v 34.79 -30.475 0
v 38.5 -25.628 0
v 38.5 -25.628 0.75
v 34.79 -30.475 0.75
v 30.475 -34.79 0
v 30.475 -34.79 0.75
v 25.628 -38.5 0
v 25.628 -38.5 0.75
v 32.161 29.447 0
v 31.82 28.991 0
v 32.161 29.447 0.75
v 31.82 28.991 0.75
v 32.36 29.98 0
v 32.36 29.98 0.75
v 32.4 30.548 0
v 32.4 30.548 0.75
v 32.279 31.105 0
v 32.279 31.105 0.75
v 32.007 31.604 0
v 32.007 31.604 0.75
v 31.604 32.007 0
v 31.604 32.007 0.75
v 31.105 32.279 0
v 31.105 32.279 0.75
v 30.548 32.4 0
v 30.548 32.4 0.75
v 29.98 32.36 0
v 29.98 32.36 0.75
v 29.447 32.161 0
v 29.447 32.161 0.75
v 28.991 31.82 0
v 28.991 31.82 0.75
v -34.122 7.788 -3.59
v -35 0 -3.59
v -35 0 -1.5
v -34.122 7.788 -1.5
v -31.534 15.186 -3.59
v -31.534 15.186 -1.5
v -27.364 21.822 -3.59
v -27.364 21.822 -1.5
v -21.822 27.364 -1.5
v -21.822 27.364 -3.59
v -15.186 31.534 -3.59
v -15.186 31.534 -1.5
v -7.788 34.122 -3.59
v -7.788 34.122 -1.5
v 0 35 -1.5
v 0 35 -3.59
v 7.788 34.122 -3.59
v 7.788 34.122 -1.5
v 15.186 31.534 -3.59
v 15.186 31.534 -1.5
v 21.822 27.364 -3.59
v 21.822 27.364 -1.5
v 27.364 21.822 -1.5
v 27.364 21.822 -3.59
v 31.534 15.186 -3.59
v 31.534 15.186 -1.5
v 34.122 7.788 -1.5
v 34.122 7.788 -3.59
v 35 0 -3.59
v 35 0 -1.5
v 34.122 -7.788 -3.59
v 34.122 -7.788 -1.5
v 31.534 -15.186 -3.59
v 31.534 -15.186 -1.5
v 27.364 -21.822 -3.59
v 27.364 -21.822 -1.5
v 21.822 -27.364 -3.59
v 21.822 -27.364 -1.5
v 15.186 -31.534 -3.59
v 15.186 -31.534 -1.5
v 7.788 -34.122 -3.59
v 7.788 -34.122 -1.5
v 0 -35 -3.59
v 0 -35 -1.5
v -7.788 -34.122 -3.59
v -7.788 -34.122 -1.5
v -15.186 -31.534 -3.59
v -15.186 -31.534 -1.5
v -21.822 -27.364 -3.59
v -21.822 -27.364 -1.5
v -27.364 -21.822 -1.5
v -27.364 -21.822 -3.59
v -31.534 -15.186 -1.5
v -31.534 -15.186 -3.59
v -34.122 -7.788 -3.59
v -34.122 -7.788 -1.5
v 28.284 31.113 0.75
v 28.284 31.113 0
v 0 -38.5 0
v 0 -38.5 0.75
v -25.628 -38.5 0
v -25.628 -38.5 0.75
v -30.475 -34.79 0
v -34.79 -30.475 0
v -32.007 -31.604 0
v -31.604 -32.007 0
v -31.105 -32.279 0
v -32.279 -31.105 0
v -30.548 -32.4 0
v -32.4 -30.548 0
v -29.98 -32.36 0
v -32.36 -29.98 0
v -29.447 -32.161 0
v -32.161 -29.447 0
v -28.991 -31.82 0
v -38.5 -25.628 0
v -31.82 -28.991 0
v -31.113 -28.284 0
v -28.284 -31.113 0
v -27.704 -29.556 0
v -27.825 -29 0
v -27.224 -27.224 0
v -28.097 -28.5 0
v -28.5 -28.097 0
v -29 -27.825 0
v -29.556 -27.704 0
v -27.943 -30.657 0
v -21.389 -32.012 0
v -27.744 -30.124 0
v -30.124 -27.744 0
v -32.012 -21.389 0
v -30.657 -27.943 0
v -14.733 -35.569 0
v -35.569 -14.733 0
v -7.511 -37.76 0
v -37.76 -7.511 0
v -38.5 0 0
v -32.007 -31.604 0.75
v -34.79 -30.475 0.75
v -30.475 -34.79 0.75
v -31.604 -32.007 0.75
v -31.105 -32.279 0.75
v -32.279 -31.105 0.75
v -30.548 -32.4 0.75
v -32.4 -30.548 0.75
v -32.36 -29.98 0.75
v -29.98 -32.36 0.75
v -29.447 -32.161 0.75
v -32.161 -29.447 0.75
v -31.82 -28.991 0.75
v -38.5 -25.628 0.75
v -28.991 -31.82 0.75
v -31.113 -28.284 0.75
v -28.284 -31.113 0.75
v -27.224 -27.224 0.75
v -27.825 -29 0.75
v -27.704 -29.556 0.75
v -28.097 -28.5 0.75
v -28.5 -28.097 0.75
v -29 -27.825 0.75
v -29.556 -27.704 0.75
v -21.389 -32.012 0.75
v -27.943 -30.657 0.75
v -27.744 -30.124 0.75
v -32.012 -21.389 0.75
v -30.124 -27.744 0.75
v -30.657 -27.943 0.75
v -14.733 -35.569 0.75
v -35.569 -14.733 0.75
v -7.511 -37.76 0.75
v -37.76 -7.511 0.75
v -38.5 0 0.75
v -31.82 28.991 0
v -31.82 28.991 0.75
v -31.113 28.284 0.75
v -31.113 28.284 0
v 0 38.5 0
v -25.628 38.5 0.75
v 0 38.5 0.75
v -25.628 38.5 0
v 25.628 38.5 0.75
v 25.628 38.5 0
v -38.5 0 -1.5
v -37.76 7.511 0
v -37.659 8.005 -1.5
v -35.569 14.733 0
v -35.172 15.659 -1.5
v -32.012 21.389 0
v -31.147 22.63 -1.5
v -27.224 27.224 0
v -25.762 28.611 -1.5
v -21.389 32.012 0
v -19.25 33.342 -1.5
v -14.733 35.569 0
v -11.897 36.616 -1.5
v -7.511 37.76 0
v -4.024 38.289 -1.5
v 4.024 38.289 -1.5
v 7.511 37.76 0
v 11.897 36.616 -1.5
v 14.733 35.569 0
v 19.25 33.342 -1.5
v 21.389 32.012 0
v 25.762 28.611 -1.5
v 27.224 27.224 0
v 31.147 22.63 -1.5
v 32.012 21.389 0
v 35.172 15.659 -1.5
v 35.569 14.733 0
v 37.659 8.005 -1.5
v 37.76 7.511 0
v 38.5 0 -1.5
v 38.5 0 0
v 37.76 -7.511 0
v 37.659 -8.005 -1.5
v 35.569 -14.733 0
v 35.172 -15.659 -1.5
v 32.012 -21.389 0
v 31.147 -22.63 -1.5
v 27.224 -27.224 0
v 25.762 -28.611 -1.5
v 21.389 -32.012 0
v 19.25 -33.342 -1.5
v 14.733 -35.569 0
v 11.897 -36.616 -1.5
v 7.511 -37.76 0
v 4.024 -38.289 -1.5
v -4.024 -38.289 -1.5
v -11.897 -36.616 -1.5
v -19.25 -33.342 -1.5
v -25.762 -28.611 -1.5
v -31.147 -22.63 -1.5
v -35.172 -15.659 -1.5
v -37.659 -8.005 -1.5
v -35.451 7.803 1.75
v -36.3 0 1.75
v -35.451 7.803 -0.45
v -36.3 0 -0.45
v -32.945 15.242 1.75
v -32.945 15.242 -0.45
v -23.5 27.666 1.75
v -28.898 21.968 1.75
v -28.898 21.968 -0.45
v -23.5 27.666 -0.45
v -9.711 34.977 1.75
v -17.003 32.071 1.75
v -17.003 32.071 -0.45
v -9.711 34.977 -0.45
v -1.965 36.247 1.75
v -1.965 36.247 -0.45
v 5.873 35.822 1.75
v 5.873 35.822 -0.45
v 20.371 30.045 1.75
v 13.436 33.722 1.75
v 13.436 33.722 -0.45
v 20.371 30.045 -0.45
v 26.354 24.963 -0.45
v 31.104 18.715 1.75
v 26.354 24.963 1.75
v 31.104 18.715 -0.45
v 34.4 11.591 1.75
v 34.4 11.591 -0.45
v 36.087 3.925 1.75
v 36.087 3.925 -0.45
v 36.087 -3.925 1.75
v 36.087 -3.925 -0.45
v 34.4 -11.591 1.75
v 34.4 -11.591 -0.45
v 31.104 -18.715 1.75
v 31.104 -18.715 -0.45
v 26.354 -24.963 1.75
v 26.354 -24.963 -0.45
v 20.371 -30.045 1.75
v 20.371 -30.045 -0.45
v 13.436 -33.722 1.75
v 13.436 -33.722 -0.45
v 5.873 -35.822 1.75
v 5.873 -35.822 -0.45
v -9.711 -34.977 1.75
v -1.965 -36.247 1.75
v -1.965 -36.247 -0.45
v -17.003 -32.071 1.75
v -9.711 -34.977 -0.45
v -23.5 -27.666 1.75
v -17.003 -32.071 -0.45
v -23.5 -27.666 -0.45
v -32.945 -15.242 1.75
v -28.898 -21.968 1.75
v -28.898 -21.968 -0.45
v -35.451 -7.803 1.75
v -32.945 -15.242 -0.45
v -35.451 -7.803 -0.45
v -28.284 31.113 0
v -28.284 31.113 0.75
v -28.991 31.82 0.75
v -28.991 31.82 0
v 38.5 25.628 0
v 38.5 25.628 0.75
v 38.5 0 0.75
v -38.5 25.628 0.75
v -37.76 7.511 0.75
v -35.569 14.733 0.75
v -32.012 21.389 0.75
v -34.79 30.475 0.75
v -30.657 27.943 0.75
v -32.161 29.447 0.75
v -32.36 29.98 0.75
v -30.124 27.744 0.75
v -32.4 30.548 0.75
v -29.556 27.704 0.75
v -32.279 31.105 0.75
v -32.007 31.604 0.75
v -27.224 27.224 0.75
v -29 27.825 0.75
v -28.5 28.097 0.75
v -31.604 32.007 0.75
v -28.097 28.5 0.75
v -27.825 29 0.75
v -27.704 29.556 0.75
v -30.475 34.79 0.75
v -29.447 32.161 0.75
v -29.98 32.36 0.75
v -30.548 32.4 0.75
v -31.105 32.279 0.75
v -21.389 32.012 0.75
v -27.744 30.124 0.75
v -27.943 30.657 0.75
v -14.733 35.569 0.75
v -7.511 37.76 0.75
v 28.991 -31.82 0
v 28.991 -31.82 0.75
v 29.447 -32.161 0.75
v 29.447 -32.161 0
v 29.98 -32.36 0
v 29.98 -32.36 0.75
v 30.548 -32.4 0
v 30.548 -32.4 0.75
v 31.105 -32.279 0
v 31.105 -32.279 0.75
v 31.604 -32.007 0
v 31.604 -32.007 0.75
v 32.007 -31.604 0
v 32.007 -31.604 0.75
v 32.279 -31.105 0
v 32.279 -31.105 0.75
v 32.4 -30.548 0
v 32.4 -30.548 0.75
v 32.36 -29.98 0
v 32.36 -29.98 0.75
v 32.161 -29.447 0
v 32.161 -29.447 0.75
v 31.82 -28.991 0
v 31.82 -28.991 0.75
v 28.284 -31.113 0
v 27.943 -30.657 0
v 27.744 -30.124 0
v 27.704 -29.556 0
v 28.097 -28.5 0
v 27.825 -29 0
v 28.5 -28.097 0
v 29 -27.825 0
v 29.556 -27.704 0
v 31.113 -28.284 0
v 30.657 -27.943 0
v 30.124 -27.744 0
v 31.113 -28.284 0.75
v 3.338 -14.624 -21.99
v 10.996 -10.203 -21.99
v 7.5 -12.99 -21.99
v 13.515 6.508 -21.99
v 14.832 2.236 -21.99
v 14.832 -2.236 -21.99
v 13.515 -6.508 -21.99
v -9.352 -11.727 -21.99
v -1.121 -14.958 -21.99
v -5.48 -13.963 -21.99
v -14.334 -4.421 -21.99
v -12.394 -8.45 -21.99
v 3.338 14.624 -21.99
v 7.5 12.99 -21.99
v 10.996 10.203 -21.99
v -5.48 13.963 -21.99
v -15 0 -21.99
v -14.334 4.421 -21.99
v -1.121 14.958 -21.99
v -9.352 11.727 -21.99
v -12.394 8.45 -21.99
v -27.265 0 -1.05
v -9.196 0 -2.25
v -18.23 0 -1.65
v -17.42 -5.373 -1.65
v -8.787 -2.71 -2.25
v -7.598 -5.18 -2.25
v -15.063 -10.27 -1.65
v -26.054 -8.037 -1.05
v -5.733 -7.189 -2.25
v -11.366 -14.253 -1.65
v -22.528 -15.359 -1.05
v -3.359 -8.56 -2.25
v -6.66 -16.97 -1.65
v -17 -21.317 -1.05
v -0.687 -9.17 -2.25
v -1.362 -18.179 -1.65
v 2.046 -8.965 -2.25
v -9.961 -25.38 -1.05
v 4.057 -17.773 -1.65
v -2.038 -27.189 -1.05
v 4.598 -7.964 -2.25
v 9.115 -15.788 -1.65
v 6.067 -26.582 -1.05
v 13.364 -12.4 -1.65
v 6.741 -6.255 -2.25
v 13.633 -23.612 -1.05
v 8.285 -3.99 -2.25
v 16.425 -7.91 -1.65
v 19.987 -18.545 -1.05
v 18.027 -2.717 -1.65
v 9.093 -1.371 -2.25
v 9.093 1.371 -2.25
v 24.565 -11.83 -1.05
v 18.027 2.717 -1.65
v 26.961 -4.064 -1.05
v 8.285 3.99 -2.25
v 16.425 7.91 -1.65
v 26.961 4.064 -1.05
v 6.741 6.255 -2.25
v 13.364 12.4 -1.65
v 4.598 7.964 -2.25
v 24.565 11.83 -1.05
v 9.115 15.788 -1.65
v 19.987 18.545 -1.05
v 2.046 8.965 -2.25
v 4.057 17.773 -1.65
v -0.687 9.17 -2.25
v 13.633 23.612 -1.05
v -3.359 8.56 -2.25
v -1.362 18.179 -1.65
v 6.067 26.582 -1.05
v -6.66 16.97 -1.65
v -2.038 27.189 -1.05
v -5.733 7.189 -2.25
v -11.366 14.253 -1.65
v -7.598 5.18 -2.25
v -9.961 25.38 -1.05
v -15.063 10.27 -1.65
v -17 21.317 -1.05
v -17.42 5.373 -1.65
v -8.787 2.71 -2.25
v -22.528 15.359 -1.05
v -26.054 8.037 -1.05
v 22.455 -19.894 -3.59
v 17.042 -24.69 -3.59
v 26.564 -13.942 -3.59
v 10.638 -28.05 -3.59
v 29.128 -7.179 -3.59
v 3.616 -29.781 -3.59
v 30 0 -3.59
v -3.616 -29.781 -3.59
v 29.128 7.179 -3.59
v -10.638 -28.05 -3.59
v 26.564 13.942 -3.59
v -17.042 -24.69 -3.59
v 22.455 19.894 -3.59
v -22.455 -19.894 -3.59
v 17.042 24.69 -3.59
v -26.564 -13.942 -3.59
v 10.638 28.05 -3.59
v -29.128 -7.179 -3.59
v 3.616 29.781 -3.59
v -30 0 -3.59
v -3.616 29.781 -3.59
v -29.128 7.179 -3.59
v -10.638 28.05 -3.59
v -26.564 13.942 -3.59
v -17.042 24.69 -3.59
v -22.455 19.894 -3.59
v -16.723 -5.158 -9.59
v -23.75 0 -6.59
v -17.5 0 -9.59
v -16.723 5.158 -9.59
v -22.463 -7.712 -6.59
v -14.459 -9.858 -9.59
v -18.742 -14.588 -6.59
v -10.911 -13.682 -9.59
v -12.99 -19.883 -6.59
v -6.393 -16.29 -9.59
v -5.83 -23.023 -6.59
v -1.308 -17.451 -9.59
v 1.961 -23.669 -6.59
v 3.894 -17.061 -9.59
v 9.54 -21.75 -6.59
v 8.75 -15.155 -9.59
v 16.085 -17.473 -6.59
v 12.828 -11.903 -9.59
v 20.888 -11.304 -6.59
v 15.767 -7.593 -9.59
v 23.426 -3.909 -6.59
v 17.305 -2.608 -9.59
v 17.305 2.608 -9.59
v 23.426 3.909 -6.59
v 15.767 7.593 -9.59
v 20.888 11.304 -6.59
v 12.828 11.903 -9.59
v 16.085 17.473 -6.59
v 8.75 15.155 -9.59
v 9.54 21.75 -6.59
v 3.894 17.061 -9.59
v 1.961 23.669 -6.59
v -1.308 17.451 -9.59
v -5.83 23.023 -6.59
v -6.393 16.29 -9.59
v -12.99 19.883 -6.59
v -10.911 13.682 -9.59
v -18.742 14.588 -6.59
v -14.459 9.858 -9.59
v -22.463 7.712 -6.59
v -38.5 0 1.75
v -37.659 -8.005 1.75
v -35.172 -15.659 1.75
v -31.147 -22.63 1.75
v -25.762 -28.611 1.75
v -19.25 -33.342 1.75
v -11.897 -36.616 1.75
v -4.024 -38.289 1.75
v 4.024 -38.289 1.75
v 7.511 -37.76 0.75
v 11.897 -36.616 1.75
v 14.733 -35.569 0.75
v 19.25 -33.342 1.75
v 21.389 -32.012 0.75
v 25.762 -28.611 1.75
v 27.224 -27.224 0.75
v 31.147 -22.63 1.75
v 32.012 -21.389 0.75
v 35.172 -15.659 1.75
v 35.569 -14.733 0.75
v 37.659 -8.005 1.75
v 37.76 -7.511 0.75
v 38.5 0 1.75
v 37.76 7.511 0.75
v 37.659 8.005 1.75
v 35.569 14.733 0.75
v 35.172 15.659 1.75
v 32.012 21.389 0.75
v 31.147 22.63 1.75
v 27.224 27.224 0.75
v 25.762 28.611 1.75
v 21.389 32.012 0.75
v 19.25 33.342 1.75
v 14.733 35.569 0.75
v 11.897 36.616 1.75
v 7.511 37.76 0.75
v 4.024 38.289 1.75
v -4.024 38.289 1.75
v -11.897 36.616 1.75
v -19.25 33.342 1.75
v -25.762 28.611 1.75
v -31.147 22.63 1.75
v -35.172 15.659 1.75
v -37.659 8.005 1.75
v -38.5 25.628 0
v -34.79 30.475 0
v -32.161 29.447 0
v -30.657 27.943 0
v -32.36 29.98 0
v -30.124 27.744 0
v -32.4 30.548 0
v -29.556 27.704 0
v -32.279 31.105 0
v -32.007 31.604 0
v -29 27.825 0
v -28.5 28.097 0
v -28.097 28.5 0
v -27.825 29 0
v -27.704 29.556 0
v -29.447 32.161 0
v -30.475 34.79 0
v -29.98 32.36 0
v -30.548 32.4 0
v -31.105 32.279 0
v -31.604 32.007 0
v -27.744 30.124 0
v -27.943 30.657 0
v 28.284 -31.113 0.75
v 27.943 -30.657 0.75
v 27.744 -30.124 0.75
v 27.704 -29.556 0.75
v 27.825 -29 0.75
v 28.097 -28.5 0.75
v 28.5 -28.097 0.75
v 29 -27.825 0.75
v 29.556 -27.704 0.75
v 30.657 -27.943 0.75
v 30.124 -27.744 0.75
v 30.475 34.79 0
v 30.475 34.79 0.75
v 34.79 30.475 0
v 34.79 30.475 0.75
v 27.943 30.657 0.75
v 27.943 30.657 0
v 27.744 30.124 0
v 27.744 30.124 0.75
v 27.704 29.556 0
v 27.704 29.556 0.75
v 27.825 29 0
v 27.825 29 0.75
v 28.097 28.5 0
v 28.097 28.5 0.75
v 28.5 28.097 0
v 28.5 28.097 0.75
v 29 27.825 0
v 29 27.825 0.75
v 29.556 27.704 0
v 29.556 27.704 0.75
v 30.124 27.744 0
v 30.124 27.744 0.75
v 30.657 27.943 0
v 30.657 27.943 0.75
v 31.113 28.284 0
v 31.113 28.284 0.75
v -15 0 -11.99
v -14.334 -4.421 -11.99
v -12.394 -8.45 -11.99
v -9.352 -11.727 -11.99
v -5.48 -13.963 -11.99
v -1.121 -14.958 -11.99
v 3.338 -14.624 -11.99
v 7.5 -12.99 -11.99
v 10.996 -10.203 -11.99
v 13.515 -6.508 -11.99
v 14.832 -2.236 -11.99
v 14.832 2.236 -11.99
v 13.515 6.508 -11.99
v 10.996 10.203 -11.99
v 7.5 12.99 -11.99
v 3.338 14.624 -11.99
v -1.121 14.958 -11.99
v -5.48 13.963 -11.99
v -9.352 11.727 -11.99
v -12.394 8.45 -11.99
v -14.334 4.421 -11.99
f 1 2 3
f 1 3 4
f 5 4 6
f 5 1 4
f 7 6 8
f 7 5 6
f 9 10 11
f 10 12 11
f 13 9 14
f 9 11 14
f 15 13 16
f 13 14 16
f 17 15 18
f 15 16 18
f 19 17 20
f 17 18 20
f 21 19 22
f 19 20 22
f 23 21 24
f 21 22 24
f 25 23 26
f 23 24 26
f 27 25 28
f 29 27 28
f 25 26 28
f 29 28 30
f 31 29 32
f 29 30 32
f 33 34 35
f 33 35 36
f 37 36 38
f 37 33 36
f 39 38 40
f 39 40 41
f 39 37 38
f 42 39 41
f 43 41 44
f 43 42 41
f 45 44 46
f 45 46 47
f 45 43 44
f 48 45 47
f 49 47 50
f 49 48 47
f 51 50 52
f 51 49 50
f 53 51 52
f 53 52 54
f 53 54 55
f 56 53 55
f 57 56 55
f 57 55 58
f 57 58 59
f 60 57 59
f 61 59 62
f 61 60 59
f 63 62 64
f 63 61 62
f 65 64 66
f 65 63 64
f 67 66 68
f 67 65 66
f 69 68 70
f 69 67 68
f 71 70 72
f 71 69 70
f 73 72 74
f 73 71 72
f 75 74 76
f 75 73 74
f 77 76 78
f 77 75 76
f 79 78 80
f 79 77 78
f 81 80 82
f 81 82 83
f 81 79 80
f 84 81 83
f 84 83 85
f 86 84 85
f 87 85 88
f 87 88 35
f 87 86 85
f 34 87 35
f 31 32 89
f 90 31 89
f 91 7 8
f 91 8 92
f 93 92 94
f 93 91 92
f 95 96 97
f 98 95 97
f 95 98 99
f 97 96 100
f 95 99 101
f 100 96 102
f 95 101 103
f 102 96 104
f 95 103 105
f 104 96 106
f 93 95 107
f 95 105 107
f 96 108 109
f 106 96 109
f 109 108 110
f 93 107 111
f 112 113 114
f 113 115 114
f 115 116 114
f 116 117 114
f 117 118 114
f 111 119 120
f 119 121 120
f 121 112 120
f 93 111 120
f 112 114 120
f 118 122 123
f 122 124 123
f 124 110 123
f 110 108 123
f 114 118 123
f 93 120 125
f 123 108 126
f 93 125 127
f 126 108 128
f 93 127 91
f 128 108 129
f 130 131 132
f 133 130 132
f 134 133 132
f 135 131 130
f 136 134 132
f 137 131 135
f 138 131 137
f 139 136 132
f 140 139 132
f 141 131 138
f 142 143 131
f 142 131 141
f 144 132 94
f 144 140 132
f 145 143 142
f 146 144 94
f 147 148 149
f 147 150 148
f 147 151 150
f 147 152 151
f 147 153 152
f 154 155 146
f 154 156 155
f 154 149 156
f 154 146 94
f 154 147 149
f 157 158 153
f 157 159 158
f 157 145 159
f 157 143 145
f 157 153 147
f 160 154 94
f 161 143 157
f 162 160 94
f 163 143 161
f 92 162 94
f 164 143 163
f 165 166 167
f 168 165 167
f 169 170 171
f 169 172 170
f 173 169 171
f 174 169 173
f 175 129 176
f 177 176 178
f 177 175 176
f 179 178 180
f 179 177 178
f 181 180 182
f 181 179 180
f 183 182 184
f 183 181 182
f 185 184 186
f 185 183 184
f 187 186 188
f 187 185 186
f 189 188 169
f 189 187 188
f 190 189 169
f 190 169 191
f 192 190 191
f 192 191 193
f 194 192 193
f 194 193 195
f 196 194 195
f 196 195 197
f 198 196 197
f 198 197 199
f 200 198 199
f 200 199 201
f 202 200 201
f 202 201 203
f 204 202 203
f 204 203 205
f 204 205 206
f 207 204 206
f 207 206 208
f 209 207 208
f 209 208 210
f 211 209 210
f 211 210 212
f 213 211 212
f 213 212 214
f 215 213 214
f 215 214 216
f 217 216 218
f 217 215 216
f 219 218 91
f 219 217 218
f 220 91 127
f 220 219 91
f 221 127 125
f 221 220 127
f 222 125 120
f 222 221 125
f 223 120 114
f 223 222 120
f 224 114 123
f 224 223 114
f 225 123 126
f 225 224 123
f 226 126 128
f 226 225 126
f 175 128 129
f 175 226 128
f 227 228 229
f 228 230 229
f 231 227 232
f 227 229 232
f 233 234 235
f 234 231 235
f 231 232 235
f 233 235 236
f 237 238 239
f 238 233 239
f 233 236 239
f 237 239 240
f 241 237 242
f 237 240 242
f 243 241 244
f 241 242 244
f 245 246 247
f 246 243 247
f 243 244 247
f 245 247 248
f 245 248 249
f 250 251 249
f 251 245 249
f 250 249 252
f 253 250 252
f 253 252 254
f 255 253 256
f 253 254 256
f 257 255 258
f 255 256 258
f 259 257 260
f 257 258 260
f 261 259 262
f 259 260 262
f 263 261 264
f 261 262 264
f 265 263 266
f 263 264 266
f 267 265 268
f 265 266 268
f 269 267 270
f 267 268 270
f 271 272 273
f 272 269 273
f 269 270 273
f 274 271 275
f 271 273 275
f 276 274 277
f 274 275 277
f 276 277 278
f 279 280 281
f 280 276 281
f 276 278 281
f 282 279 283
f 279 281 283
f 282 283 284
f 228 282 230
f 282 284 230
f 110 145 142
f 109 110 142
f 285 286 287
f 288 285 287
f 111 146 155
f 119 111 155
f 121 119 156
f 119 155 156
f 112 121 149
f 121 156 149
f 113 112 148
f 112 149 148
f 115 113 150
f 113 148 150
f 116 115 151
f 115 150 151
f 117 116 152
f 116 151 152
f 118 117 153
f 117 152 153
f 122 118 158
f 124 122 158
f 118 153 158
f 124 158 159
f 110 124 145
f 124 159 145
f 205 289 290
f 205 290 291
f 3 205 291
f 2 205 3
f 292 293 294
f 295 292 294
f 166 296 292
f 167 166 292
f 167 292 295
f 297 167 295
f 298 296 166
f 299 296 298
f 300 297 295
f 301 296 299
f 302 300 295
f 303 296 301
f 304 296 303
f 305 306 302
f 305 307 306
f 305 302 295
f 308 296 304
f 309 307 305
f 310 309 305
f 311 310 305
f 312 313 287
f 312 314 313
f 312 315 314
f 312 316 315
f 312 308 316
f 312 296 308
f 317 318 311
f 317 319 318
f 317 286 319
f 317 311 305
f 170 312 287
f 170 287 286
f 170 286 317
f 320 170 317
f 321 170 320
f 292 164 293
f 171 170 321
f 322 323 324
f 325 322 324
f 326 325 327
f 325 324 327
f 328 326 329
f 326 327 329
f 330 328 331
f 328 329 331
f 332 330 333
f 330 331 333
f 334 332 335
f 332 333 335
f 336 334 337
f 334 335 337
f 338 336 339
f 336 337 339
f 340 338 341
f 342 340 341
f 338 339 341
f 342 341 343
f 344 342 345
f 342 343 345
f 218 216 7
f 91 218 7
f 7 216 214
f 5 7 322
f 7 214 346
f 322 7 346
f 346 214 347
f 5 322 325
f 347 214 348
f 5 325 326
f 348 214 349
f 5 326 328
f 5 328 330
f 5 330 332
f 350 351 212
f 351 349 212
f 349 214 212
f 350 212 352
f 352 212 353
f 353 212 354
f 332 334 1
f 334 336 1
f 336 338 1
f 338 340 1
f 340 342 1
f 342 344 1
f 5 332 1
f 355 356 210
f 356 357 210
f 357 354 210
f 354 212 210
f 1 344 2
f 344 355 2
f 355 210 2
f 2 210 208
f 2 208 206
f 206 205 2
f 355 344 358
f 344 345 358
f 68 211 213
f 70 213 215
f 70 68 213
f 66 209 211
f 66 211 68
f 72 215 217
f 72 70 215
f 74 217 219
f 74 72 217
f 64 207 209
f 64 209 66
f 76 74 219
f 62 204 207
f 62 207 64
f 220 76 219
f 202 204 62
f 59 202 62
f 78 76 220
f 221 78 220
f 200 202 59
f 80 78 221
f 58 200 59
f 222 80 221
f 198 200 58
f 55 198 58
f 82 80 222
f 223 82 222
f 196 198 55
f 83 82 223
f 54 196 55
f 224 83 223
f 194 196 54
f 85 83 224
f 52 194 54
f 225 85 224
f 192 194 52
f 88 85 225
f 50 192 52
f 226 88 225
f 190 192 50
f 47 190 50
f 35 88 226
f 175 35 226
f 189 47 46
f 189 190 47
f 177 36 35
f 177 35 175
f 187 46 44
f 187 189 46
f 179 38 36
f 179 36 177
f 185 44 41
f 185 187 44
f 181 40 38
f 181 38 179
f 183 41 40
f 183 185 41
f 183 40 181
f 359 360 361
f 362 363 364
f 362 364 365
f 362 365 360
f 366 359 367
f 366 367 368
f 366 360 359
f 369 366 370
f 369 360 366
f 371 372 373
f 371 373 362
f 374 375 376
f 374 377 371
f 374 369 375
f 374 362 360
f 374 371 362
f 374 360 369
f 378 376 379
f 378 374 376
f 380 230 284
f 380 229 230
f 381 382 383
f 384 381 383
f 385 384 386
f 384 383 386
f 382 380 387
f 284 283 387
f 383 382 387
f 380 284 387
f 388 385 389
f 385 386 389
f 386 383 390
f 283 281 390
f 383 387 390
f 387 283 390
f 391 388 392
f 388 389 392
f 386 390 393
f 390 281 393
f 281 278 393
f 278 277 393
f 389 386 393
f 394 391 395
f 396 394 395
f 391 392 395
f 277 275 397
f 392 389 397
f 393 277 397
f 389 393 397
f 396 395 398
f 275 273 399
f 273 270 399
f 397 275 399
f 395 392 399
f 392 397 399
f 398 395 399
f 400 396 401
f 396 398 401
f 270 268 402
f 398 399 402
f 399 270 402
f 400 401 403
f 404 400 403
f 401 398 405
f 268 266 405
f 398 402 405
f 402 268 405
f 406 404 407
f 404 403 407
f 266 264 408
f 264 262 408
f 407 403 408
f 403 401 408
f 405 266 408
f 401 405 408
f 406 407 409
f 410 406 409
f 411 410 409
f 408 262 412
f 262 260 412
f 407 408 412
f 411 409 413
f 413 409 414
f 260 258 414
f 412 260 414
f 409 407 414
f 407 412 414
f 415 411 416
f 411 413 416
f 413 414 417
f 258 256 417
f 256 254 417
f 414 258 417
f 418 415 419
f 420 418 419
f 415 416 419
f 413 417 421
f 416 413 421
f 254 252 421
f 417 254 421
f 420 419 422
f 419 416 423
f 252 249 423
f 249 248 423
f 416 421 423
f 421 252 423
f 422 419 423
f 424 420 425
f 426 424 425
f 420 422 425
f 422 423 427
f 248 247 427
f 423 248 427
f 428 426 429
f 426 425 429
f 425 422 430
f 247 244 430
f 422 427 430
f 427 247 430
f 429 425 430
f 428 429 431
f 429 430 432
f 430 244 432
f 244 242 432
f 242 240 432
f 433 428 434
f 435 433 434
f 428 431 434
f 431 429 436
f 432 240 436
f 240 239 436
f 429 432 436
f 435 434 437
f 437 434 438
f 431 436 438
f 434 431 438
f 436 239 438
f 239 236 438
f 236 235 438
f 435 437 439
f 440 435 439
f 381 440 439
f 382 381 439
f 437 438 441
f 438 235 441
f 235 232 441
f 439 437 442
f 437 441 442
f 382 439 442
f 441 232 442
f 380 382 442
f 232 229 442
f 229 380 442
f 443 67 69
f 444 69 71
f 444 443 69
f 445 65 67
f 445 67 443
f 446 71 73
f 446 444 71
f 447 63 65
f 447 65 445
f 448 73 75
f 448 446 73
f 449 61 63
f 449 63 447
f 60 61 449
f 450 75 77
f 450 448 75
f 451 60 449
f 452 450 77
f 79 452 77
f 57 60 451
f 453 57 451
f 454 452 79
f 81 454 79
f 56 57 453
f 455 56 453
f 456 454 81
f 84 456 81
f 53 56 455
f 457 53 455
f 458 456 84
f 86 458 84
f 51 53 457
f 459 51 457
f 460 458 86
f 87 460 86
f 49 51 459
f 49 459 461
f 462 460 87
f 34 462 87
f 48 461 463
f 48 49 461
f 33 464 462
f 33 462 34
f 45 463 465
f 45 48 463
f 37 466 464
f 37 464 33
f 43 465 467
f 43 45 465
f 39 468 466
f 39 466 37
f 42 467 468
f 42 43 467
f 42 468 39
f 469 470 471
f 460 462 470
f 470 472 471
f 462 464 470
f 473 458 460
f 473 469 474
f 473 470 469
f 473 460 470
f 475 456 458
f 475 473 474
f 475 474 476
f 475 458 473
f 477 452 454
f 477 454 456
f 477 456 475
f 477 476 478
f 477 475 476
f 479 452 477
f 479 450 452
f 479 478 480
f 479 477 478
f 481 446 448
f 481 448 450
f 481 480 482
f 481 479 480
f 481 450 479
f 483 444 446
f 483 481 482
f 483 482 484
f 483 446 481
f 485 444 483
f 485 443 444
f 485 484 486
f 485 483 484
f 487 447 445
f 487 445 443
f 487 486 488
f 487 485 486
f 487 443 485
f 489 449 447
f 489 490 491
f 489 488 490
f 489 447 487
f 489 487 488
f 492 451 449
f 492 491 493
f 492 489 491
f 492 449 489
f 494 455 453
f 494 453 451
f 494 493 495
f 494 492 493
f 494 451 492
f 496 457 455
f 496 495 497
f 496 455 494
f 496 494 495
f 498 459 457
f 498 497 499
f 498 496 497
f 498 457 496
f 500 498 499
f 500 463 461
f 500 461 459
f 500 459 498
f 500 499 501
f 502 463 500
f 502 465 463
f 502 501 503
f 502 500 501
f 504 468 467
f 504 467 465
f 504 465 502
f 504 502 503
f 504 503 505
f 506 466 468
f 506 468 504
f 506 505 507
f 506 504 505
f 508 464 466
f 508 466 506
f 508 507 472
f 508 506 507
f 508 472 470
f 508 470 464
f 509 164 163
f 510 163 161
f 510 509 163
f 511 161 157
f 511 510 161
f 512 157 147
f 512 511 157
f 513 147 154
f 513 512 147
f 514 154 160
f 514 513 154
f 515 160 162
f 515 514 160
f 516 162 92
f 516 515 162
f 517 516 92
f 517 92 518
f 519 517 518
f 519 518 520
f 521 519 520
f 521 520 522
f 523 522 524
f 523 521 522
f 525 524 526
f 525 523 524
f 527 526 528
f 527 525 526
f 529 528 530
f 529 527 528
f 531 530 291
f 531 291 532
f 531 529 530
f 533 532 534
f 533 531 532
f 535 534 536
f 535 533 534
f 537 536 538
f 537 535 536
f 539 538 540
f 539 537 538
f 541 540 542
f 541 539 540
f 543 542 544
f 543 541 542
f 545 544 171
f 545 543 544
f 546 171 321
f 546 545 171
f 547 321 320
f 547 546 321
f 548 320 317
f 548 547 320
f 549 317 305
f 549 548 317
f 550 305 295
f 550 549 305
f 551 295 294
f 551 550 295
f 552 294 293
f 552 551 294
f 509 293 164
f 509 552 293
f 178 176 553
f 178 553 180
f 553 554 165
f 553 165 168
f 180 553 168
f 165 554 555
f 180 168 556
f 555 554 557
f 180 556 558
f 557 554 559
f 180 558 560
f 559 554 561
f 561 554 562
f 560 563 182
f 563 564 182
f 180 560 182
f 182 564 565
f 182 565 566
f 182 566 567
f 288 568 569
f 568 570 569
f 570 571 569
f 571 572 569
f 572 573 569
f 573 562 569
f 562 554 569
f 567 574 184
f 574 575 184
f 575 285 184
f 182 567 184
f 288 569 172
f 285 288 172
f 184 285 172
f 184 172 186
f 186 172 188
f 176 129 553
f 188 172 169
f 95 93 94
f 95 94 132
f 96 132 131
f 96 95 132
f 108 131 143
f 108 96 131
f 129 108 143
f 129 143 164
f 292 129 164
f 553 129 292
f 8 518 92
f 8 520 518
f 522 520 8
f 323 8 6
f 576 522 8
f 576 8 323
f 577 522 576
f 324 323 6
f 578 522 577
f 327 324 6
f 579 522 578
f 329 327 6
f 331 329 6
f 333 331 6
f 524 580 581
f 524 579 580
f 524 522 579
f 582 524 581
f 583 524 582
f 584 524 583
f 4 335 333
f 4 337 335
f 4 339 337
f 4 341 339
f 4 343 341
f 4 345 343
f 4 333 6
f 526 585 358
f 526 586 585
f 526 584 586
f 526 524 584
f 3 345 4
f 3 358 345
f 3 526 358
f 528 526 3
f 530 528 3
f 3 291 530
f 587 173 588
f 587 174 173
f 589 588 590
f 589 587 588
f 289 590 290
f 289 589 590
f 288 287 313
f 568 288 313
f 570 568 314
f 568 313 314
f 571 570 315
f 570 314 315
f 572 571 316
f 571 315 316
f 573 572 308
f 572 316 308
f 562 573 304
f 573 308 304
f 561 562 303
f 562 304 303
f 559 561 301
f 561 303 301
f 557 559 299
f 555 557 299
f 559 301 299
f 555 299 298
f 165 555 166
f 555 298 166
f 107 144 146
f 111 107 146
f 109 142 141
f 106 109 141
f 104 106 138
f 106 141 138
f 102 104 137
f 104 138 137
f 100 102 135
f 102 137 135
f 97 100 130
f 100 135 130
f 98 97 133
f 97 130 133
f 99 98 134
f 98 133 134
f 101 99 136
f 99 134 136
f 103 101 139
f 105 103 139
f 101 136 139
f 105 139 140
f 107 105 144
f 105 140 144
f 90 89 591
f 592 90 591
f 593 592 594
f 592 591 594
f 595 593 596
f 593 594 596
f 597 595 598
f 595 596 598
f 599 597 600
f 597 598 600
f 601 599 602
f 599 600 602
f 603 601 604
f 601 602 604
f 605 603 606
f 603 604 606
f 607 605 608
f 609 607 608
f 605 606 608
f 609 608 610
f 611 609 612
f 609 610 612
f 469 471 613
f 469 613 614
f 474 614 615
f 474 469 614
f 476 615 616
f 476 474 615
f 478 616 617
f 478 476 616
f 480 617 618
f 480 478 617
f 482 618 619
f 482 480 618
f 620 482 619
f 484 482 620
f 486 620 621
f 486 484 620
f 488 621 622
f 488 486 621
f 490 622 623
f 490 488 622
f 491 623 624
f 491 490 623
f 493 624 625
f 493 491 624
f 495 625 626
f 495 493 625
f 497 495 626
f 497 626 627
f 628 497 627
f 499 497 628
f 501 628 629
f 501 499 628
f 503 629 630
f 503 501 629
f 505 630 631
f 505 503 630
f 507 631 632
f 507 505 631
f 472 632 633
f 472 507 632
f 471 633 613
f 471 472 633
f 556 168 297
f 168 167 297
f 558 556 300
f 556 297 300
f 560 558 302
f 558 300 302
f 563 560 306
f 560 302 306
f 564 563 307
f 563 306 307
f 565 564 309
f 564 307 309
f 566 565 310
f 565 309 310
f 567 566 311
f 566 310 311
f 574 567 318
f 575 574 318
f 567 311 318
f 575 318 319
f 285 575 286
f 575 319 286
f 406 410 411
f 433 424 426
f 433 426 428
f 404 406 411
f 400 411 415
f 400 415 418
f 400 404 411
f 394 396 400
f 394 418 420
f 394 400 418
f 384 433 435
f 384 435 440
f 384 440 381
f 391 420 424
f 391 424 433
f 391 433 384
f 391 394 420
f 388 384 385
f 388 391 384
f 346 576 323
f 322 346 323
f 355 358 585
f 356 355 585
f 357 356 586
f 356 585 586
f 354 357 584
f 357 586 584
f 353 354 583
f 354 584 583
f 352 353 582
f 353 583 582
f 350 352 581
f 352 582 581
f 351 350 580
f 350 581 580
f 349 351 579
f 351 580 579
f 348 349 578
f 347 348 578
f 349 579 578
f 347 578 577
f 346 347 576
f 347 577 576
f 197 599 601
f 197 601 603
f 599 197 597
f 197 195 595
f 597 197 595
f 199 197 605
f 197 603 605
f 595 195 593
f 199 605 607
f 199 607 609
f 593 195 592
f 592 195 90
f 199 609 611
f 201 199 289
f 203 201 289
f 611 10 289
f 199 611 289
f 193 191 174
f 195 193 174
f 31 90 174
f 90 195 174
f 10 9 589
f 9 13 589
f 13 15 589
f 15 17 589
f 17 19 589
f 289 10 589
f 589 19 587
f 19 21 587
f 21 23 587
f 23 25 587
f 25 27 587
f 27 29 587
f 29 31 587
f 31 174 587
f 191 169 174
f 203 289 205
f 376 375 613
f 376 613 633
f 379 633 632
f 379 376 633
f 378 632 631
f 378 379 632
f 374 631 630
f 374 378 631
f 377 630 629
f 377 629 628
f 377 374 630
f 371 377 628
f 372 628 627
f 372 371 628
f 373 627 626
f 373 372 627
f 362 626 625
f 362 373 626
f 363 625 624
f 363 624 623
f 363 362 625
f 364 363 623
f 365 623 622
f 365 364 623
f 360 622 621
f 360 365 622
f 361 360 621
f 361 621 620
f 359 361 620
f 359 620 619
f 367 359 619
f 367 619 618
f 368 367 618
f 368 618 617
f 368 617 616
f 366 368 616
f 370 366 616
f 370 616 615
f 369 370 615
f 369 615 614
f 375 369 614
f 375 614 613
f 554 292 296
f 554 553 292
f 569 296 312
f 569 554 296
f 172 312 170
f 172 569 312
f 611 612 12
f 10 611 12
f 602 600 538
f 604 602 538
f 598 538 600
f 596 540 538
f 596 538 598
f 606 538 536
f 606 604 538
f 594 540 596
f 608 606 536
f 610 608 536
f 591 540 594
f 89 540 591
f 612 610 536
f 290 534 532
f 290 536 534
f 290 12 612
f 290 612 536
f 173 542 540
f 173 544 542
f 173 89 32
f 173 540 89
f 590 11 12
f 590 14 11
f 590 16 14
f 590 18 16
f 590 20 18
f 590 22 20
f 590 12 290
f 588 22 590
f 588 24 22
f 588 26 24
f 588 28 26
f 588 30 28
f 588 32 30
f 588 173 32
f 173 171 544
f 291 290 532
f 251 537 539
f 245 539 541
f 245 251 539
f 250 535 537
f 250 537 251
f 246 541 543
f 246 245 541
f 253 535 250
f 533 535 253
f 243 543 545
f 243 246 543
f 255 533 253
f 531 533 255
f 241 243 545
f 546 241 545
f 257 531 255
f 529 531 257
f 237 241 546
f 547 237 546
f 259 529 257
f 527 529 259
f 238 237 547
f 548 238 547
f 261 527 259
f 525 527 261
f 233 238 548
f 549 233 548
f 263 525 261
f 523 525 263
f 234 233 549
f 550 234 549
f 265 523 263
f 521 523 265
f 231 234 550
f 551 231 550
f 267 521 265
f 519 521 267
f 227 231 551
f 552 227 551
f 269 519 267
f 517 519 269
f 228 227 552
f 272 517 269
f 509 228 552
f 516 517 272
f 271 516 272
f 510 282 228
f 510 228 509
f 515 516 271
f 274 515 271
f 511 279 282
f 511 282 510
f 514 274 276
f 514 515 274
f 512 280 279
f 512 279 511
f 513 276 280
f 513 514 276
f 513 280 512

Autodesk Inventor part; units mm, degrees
ref_plane "YZ Plane" through (0, 0, 0) normal (1, 0, 0) x (0, 1, 0)
ref_plane "XZ Plane" through (0, 0, 0) normal (0, 1, 0) x (-1, 0, 0)
ref_plane "XY Plane" through (0, 0, 0) normal (0, 0, 1) x (1, 0, 0)
sketch "스케치1" plane through (0, 0, 0) normal (0, 0, 1) x (1, 0, 0)
  circle A0 centre (0, 0) radius 46.25
  line L0 (-38.5, 38.5) -> (38.5, 38.5)
  line L1 (38.5, 38.5) -> (38.5, -38.5)
  line L2 (38.5, -38.5) -> (-38.5, -38.5)
  line L3 (-38.5, -38.5) -> (-38.5, 38.5)
  line L4 (-38.5, 38.5) -> (38.5, -38.5) construction
  line L5 (38.5, 38.5) -> (-38.5, -38.5) construction
  point P0 (-38.5, 25.6284)
  point P1 (-38.5, -25.6284)
  point P2 (-25.6284, -38.5)
  point P3 (25.6284, -38.5)
  point P4 (38.5, -25.6284)
  point P5 (38.5, 25.6284)
  point P6 (25.6284, 38.5)
  point P7 (-25.6284, 38.5)
  dimension "d0" = 92.5
  dimension "d1" = 77
  dimension "d2" = 77
extrude "돌출1" add sketch "스케치1" along normal blind 0.75 contours L1 A0 L2 L3 L0
sketch "스케치2" plane through (0, 0, 0) normal (0, 1, 0) x (-1, 0, 0)
  line L0 (25.6284, 0.75) -> (-25.6284, 0.75) projected
  line L1 (0, 0.75) -> (0, -28.2062)
  line L2 (38.5, 0) -> (38.5, -1.5)
  line L3 (38.5, -1.5) -> (35, -1.5)
  line L4 (35, -1.5) -> (35, -3.59)
  line L5 (35, -3.59) -> (0, -3.59)
  line L6 (38.5, 0) -> (25.6284, 0) projected
  line L7 (30, -3.59) -> (17.5, -9.59)
  line L8 (17.5, -9.59) -> (15, -11.99)
  line L9 (15, -11.99) -> (15, -21.99)
  line L10 (15, -21.99) -> (0, -21.99)
  line L11 (-25.6284, 0) -> (25.6284, 0) projected
  point P0 (0, 0)
  point P1 (0, 0)
  dimension "d5" = 1.5
  dimension "d6" = 2.09
  dimension "d7" = 77
  dimension "d8" = 70
  dimension "d9" = 60
  dimension "d10" = 35
  dimension "d11" = 30
  dimension "d12" = 6
  dimension "d13" = 2.4
  dimension "d14" = 10
revolve "회전1" add sketch "스케치2" angle 360 about axis through (0, 0, 0.75) along (0, 0, -1)
sketch "스케치3" plane through (0, 0, 0) normal (0, 1, 0) x (-1, 0, 0)
  line L0 (38.5, 0) -> (38.5, 0.75) projected
  line L1 (38.5, 0.75) -> (38.5, 1.75)
  line L2 (38.5, 1.75) -> (36.3, 1.75)
  line L3 (36.3, 1.75) -> (36.3, 0.75)
  line L4 (38.5, 0.75) -> (25.6284, 0.75) projected
  line L5 (9.1955, -2.25) -> (0, -2.25)
  line L6 (-35, -1.5) -> (35, -1.5) projected
  line L7 (0, -2.25) -> (0, 0.75)
  line L8 (25.6284, 0.75) -> (-25.6284, 0.75) projected
  line L9 (36.3, 0.75) -> (0, 0.75)
  line L10 (0, 0) -> (-25.6284, 0) projected
  line L11 (36.3, 0.75) -> (36.3, -0.45)
  line L12 (36.3, -0.45) -> (9.1955, -2.25)
  point P0 (20.489, -1.5)
  point P1 (0, -1.5)
  dimension "d16" = 1
  dimension "d17" = 2.2
  dimension "d18" = 1.2
  dimension "d19" = 3
revolve "회전2" add sketch "스케치3" angle 360 about axis through (0, 0, -2.25) along (0, 0, 1) contours L4 L3 L2 L1
revolve "회전3" cut sketch "스케치3" angle 360 about axis through (0, 0, -2.25) along (0, 0, 1) contours L11 L12 L6 L7 L8 L4 | L12 L5 L7 L6
sketch "스케치4" plane through (0, 0, 0.75) normal (0, 0, 1) x (1, 0, 0)
  circle A0 centre (0, 0) radius 42 construction
  line L0 (0, 0) -> (0, 16.8085)
  line L1 (0, 0) -> (-29.6985, 29.6985) construction
  line L2 (-29.6985, 29.6985) -> (-30.4056, 30.4056) construction
  line L3 (-28.2843, 31.1127) -> (-28.9914, 31.8198)
  line L4 (-31.8198, 28.9914) -> (-31.1127, 28.2843)
  arc A1 (-31.1127, 28.2843) -> (-28.2843, 31.1127) centre (-29.6985, 29.6985) ccw
  arc A2 (-28.9914, 31.8198) -> (-31.8198, 28.9914) centre (-30.4056, 30.4056) ccw
  point P0 (-30.052, 30.052)
  dimension "d22" = 84
  dimension "d23" = 45
  dimension "d24" = 1
  dimension "d25" = 4
extrude "돌출2" cut sketch "스케치4" against normal blind 0.75
pattern_circular "원형 패턴1" count 4 over 360 about axis through (0, 0, 1.25) along (0, 0, 1) of "돌출2"
properties part number "스피커"
